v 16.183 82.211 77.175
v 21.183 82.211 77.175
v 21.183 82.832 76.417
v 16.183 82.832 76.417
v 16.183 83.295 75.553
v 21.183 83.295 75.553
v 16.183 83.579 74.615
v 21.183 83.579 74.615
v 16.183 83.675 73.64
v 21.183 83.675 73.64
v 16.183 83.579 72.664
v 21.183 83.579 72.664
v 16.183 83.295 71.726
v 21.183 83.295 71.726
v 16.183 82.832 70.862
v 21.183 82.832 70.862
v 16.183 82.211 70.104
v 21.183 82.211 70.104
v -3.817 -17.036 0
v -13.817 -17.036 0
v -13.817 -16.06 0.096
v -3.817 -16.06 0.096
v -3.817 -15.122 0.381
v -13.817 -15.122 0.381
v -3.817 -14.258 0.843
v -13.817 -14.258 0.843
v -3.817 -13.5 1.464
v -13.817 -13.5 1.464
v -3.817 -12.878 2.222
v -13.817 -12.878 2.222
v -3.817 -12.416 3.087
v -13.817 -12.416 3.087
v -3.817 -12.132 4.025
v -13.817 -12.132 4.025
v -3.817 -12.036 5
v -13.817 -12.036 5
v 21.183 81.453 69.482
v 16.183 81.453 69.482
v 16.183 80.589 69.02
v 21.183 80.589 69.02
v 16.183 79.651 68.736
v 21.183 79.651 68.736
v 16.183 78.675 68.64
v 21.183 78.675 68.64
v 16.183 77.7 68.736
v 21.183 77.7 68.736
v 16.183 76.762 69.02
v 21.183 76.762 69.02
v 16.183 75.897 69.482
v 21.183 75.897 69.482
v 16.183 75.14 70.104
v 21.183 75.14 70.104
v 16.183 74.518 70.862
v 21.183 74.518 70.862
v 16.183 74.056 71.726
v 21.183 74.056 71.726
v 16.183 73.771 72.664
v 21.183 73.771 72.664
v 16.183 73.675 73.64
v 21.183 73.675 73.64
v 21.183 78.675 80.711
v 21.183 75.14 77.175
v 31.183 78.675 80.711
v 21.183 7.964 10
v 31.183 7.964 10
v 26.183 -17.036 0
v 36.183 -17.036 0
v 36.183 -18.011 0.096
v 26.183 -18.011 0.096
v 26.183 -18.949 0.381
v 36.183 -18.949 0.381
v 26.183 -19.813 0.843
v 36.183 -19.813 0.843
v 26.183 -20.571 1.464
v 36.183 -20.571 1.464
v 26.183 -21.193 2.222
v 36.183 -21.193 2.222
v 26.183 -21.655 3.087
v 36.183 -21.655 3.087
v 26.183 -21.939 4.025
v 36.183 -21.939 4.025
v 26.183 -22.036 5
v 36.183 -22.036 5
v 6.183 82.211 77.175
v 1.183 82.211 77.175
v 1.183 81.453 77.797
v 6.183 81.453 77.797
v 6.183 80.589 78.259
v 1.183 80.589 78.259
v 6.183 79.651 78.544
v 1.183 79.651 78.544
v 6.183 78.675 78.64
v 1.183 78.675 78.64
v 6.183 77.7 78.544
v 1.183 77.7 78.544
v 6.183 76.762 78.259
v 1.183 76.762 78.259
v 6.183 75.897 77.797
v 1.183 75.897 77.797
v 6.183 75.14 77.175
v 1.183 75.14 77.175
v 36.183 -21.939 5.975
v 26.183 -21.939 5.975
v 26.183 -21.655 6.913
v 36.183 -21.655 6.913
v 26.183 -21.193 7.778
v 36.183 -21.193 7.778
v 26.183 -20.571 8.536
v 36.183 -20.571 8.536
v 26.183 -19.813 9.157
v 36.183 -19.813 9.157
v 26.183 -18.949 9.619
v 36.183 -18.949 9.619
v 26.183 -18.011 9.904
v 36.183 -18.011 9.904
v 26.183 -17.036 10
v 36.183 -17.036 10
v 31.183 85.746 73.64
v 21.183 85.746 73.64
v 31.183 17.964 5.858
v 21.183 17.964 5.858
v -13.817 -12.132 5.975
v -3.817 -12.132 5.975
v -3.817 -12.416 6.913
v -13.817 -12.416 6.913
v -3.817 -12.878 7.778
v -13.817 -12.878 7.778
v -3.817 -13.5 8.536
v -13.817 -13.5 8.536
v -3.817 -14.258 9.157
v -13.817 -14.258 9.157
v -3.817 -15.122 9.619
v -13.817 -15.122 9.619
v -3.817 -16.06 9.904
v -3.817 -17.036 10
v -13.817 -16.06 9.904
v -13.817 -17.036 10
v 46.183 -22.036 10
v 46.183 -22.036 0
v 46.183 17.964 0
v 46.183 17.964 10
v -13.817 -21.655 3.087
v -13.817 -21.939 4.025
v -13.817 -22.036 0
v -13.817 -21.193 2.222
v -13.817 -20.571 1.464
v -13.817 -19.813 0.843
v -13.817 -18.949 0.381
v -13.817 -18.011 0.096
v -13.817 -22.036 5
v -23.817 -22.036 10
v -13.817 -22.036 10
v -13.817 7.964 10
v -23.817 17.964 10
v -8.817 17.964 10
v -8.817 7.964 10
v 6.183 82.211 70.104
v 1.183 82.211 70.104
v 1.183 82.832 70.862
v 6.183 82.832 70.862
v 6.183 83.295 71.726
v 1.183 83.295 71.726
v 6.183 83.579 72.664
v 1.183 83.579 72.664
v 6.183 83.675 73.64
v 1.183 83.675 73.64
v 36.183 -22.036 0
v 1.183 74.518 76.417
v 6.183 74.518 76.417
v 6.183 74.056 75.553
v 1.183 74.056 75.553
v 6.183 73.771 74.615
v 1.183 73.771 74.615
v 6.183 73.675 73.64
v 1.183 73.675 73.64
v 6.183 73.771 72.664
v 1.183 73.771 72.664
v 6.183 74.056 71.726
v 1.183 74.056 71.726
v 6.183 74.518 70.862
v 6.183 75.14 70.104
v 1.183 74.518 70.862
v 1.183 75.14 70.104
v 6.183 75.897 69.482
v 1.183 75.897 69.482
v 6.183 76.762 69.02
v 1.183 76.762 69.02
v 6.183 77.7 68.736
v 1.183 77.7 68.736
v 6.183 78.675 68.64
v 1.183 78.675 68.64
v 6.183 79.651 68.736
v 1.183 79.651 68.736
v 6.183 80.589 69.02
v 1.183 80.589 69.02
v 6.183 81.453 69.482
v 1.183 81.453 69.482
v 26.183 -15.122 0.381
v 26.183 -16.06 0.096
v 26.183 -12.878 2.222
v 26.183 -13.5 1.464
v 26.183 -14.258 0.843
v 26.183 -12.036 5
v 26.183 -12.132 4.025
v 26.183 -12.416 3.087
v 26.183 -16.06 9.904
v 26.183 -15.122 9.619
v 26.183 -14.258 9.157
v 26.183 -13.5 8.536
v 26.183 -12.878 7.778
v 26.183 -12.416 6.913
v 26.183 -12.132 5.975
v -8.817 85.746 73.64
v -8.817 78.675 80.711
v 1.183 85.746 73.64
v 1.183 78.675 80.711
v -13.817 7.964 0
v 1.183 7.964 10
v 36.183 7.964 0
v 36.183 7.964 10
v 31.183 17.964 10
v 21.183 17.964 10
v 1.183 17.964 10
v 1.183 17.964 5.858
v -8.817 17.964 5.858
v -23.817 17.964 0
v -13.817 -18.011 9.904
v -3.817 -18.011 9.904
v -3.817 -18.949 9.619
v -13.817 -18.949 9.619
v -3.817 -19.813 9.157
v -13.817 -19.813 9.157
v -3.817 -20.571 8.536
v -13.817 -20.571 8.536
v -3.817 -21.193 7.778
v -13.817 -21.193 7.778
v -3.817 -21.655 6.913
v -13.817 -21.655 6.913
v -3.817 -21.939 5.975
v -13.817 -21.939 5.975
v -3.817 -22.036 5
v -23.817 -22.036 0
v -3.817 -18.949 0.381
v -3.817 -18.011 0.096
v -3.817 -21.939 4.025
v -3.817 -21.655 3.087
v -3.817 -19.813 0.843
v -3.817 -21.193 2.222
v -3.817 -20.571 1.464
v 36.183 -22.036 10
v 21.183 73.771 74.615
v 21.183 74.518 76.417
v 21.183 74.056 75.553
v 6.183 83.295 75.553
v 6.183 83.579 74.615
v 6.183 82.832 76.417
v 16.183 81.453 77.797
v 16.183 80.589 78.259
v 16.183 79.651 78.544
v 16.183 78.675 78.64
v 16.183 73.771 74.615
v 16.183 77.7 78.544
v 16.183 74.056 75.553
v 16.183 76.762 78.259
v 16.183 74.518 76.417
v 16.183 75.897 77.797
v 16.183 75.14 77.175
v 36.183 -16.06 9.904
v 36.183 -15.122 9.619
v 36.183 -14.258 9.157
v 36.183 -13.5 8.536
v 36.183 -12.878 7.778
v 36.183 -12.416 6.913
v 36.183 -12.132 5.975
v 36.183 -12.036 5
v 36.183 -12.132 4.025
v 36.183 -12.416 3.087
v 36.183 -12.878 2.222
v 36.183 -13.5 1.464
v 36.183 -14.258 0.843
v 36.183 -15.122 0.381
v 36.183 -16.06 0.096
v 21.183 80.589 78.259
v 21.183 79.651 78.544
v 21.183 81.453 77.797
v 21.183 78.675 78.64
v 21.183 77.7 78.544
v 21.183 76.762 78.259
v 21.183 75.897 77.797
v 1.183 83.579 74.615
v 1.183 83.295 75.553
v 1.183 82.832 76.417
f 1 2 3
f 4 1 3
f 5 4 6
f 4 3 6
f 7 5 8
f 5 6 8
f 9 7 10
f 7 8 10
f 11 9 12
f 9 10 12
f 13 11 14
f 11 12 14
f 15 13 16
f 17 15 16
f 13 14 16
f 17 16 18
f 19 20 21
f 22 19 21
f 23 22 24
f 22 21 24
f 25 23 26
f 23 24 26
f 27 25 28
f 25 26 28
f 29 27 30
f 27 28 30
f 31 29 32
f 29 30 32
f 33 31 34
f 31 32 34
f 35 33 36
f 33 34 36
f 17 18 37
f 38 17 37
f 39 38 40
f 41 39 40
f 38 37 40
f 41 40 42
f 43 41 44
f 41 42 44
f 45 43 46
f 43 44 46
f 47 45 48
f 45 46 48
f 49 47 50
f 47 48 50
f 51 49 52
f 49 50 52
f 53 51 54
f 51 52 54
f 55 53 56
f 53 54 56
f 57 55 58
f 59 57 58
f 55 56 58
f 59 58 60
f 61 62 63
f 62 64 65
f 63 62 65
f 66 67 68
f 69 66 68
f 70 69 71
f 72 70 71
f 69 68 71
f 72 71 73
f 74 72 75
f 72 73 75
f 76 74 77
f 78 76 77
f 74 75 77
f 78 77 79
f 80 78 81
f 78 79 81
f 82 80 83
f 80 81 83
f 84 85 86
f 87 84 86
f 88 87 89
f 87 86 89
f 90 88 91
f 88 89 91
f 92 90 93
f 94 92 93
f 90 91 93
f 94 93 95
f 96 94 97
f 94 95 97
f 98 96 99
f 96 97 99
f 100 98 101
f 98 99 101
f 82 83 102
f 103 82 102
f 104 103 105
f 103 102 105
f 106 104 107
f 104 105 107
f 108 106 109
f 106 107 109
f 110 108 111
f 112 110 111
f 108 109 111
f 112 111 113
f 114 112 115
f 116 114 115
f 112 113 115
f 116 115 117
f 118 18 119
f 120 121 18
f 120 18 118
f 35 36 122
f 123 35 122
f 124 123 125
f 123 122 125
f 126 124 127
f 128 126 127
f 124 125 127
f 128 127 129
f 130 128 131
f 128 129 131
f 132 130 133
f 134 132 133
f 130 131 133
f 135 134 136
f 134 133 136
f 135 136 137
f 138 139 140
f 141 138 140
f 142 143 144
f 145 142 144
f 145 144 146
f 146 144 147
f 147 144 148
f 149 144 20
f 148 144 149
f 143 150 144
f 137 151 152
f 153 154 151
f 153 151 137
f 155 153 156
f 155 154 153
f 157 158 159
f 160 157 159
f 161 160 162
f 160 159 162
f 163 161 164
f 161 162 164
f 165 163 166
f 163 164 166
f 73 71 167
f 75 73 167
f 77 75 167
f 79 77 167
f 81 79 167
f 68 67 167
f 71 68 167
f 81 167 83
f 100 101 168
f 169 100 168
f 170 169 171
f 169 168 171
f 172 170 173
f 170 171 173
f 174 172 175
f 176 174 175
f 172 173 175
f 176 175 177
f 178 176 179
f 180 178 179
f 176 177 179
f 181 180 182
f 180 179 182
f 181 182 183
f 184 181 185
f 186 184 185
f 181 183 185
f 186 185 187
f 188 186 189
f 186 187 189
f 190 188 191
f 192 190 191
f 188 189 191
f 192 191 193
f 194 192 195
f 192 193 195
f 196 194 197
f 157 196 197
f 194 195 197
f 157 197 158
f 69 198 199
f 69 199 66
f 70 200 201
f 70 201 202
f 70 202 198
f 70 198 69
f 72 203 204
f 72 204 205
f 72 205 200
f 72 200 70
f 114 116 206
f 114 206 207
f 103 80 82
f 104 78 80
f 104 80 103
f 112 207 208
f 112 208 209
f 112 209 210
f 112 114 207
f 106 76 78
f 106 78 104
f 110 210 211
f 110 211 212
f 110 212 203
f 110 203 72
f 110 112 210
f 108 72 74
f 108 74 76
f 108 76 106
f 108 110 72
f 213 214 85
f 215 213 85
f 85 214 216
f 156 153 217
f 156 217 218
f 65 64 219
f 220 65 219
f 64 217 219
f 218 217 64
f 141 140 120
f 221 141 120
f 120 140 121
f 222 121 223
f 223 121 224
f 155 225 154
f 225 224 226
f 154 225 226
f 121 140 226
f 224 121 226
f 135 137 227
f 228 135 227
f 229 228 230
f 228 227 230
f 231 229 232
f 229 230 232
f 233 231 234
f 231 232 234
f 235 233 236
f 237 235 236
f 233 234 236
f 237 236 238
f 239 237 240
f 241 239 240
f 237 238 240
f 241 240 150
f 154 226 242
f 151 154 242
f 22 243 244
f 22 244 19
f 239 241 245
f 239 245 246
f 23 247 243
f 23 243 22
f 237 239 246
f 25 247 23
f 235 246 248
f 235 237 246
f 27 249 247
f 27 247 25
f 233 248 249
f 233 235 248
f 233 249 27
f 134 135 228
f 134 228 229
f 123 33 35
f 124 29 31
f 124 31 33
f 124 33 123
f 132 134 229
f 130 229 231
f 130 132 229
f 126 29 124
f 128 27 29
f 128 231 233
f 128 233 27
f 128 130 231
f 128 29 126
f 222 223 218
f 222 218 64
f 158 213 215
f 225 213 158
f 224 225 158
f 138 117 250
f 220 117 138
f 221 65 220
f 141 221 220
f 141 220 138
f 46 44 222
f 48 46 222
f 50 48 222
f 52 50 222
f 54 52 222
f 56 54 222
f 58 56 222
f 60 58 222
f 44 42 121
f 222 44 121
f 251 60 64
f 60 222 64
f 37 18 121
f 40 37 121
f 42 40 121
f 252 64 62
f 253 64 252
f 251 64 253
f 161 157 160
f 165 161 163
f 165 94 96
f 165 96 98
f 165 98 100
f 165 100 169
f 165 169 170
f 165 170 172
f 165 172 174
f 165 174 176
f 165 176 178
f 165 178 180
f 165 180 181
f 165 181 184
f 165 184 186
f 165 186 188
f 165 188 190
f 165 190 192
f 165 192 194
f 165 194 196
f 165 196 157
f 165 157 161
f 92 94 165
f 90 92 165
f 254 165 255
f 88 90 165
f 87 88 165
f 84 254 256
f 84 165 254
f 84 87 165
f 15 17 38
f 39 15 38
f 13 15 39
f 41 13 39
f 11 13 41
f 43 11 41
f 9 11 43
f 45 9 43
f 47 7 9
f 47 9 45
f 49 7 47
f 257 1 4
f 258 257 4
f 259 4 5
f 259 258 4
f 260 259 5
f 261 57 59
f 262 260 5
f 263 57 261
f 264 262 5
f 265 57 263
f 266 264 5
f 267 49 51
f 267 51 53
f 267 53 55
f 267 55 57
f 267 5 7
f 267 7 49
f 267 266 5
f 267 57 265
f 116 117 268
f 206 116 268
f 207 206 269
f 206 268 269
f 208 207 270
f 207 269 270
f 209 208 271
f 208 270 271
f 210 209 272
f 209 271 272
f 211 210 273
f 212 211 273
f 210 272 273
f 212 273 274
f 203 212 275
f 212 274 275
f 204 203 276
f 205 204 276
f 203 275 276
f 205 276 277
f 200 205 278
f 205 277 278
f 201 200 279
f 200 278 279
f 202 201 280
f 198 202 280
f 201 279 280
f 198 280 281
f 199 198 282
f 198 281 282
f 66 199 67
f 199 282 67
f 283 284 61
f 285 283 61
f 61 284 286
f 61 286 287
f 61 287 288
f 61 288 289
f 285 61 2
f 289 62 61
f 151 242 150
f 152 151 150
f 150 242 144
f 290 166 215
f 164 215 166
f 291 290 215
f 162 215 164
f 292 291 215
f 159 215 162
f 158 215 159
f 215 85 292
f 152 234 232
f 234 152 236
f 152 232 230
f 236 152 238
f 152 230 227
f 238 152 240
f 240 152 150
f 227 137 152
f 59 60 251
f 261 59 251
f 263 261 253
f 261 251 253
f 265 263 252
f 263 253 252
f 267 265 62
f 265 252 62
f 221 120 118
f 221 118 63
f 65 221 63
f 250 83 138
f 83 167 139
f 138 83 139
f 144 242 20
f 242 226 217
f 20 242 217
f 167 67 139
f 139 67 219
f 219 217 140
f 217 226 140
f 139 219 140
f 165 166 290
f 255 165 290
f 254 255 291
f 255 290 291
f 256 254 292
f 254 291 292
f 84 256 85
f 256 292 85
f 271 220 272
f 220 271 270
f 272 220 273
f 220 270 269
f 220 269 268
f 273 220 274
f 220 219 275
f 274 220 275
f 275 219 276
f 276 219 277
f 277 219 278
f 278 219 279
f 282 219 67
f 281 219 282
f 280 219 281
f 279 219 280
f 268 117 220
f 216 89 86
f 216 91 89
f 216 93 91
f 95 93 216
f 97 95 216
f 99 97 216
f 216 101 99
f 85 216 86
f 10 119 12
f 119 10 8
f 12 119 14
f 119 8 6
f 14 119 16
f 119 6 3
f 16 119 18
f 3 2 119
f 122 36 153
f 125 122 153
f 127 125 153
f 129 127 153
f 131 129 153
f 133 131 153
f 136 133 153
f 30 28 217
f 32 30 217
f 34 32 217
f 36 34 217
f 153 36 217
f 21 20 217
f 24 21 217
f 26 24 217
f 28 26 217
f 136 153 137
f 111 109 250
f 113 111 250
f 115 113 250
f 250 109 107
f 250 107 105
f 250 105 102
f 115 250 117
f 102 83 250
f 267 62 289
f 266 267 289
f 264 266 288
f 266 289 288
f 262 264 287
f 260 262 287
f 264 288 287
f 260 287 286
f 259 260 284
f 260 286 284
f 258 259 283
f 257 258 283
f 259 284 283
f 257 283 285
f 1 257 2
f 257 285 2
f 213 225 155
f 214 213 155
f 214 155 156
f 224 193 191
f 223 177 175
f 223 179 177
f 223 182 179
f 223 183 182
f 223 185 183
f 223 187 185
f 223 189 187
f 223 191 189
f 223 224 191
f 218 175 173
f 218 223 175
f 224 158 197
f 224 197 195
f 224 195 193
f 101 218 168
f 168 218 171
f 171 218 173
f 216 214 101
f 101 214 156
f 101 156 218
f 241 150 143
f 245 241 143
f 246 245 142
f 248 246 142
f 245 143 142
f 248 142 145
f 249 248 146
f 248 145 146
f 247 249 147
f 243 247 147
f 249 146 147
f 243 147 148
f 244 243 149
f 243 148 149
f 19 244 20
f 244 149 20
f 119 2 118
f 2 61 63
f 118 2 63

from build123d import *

# Parameters (mm, degrees)
F1_DEPTH  = 10
F3_DEPTH  = 10
F5_DEPTH  = 10
F7_W      = 10
F7_H      = 10
F8_DEPTH  = 100
F10_DEPTH = 5
F12_DEPTH = 5


with BuildPart() as f1:
    # F0 (on Top) → F1 (new body)
    with BuildSketch(Plane.XY):
        Polygon((-23.817373896, 17.9644496739), (-23.817373896, -22.0355503261), (-13.817373896, -22.0355503261), (-13.817373896, -12.0355503261), (-13.817373896, 7.9644496739), (11.182626104, 7.9644496739), (36.182626104, 7.9644496739), (36.182626104, -12.0355503261), (36.182626104, -22.0355503261), (46.182626104, -22.0355503261), (46.182626104, 17.9644496739), (11.182626104, 17.9644496739), align=None)
    extrude(amount=F1_DEPTH)

    # F2 (on face) → F3 (join)
    with BuildSketch(Plane.YZ.offset(-13.817373896)):
        with BuildLine():
            ThreePointArc((-17.0355503261, 0), (-13.5000164202, 1.4644660941), (-12.0355503261, 5))
            ThreePointArc((-12.0355503261, 5), (-13.5000164202, 8.5355339059), (-17.0355503261, 10))
            ThreePointArc((-17.0355503261, 10), (-20.571084232, 8.5355339059), (-22.0355503261, 5))
            ThreePointArc((-22.0355503261, 5), (-20.571084232, 1.4644660941), (-17.0355503261, 0))
        make_face()
    extrude(amount=F3_DEPTH)

    # F4 (on face) → F5 (join)
    with BuildSketch(Plane(origin=(36.182626104, 0, 0), x_dir=(0, -1, 0), z_dir=(-1, 0, 0))):
        with BuildLine():
            ThreePointArc((17.0355503261, 0), (20.571084232, 1.4644660941), (22.0355503261, 5))
            ThreePointArc((22.0355503261, 5), (20.571084232, 8.5355339059), (17.0355503261, 10))
            ThreePointArc((17.0355503261, 10), (12.0355503261, 5), (17.0355503261, 0))
        make_face()
    extrude(amount=F5_DEPTH)

    # F7 (on face) → F8 (join)
    with BuildSketch(Plane(origin=(0, 8.9822248369, 8.9822248369), x_dir=(1, 0, 0), z_dir=(0, -0.7071067812, -0.7071067812))):
        with Locations((26.182626104, -3.560648561)):
            Rectangle(F7_W, F7_H)
        with Locations((-3.817373896, -3.560648561)):
            Rectangle(F7_W, F7_H)
    extrude(amount=-F8_DEPTH)

    # F9 (on face) → F10 (join)
    with BuildSketch(Plane.YZ.offset(1.182626104)):
        with BuildLine():
            ThreePointArc((82.2106616934, 70.1040763958), (83.2945254537, 71.7261931416), (83.6751277925, 73.6396103068))
            ThreePointArc((83.6751277925, 73.6396103068), (83.2945254551, 75.5530274686), (82.2106616985, 77.1751442127))
            ThreePointArc((82.2106616985, 77.1751442127), (78.6751277925, 78.6396103068), (75.1395938866, 77.1751442127))
            ThreePointArc((75.1395938866, 77.1751442127), (75.1395938841, 70.1040764034), (82.2106616934, 70.1040763958))
        make_face()
    extrude(amount=F10_DEPTH)

    # F11 (on face) → F12 (join)
    with BuildSketch(Plane(origin=(21.182626104, 0, 0), x_dir=(0, -1, 0), z_dir=(-1, 0, 0))):
        with BuildLine():
            ThreePointArc((-82.2106617767, 70.104076479), (-76.7617106818, 69.0202126231), (-73.6751277925, 73.6396103068))
            ThreePointArc((-73.6751277925, 73.6396103068), (-74.0557301241, 75.5530274545), (-75.139593865, 77.1751441911))
            ThreePointArc((-75.139593865, 77.1751441911), (-78.6751277889, 78.6396103068), (-82.210661715, 77.1751441962))
            ThreePointArc((-82.210661715, 77.1751441962), (-83.6751277925, 73.6396103504), (-82.2106617767, 70.104076479))
        make_face()
    extrude(amount=F12_DEPTH)


solid = f1.part
